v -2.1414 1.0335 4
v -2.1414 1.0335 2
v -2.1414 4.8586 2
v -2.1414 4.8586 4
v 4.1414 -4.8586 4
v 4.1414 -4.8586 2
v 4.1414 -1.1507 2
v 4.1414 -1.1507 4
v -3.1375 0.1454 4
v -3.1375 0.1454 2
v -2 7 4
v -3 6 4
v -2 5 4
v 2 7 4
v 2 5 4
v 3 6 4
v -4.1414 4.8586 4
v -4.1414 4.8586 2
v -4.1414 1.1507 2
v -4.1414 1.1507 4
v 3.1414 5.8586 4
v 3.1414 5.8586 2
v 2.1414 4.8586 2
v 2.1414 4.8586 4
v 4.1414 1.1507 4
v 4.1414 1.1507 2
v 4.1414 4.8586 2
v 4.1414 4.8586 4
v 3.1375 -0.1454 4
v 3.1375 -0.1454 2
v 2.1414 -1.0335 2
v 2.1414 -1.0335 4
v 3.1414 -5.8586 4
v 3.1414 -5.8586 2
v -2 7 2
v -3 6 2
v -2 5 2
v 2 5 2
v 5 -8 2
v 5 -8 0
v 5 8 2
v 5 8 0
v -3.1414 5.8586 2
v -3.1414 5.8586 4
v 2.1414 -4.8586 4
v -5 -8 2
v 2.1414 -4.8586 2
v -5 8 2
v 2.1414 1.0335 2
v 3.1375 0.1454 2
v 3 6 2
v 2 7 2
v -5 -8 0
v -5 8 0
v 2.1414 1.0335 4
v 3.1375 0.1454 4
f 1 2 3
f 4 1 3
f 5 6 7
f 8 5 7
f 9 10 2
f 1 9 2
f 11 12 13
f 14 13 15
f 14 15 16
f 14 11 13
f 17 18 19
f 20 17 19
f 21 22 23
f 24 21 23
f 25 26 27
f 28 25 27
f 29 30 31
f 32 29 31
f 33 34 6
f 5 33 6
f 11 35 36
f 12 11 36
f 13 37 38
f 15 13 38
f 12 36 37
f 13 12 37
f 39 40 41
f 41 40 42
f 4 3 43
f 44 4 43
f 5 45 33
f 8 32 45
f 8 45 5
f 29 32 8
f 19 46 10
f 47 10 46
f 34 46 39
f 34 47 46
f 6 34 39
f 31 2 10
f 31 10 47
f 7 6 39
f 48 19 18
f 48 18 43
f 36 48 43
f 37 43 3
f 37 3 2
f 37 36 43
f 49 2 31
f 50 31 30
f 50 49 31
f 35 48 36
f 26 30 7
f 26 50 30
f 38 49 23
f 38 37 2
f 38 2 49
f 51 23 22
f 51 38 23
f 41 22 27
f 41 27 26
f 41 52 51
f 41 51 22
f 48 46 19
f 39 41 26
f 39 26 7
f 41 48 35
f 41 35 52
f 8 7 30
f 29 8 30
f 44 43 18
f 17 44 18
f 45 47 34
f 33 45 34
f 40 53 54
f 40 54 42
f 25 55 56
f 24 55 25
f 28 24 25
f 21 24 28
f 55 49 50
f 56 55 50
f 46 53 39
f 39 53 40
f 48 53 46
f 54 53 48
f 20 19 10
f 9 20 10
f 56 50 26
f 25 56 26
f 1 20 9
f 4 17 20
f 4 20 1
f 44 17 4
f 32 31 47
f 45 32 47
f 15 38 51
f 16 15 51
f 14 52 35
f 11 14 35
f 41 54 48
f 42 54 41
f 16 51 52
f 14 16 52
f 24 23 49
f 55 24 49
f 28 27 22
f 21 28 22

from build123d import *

# Parameters (mm, degrees)
F0_W     = 10
F0_H     = 16
F1_DEPTH = 2
F3_DEPTH = 2


with BuildPart() as f1:
    # F0 (on Top) → F1 (new body)
    with BuildSketch(Plane.XY):
        Rectangle(F0_W, F0_H)
    extrude(amount=F1_DEPTH)

    # F2 (on face) → F3 (join)
    with BuildSketch(Plane.XY.offset(2)):
        Polygon((0, 7), (-2, 7), (-3, 6), (-2, 5), (0, 5), (2, 5), (3, 6), (2, 7), align=None)
        Polygon((-2.141421, 4.858579), (-3.141421, 5.858579), (-4.141421, 4.858579), (-4.141421, 1.150722), (-3.137452, 0.145399), (-2.141421, 1.03352), align=None)
        Polygon((4.141421, 4.858579), (3.141421, 5.858579), (2.141421, 4.858579), (2.141421, 1.03352), (3.137452, 0.145399), (4.141421, 1.150722), align=None)
        Polygon((3.137452, -0.145399), (2.141421, -1.03352), (2.141421, -4.858579), (3.141421, -5.858579), (4.141421, -4.858579), (4.141421, -1.150722), align=None)
    extrude(amount=F3_DEPTH)


solid = f1.part
